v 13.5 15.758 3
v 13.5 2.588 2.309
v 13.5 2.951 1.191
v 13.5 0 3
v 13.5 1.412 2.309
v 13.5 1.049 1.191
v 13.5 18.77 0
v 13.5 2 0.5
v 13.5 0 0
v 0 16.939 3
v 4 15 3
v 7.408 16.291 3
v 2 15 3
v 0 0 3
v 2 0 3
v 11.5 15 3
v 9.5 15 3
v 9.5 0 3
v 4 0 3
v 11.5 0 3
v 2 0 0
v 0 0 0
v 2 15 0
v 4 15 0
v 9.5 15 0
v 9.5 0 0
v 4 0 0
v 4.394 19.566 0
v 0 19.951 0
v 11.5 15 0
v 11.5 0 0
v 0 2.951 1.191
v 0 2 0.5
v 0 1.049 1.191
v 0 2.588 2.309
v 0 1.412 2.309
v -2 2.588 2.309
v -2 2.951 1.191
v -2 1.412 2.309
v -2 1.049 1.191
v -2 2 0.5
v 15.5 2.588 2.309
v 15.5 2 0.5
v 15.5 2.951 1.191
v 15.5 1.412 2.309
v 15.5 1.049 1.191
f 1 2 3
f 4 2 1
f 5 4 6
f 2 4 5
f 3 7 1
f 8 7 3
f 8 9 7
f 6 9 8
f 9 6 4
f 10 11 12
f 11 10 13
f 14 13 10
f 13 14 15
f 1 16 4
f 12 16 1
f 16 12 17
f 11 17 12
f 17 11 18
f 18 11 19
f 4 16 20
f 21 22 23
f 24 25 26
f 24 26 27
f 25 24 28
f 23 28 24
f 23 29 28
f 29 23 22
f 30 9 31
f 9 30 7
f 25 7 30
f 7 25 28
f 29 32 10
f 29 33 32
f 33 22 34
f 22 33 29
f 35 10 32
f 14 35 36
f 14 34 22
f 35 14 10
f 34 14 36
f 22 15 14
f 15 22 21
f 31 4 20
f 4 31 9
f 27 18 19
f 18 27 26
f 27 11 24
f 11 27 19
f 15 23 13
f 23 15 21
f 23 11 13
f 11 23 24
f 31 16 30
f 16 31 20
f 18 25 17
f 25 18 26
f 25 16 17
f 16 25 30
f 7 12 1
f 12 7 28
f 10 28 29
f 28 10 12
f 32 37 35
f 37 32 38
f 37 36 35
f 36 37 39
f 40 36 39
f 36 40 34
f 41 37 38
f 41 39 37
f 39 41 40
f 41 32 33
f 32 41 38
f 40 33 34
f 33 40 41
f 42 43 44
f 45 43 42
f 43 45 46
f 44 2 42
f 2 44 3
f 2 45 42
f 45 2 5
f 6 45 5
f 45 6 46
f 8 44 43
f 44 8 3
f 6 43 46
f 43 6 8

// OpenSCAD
width=13.5;
length=20;
height=3;

pin_length=2;
pin_radius=1;

difference() {
    cube([width, length, height]);

    // flex holes
    translate([2, 0, 0]) cube([2, length-5, height]);
    translate([width - 4, 0, 0]) cube([2, length-5, height]);

    // slope
    translate([-1, length/2, length/2]) rotate([-45, 0, -5]) cube([width + 2, length, height]);
}


translate([-pin_length, pin_radius + 1, height/2]) rotate([0, 90, 0]) cylinder(r=pin_radius, pin_length);
translate([width, pin_radius + 1, height/2]) rotate([0, 90, 0]) cylinder(r=pin_radius, pin_length);
